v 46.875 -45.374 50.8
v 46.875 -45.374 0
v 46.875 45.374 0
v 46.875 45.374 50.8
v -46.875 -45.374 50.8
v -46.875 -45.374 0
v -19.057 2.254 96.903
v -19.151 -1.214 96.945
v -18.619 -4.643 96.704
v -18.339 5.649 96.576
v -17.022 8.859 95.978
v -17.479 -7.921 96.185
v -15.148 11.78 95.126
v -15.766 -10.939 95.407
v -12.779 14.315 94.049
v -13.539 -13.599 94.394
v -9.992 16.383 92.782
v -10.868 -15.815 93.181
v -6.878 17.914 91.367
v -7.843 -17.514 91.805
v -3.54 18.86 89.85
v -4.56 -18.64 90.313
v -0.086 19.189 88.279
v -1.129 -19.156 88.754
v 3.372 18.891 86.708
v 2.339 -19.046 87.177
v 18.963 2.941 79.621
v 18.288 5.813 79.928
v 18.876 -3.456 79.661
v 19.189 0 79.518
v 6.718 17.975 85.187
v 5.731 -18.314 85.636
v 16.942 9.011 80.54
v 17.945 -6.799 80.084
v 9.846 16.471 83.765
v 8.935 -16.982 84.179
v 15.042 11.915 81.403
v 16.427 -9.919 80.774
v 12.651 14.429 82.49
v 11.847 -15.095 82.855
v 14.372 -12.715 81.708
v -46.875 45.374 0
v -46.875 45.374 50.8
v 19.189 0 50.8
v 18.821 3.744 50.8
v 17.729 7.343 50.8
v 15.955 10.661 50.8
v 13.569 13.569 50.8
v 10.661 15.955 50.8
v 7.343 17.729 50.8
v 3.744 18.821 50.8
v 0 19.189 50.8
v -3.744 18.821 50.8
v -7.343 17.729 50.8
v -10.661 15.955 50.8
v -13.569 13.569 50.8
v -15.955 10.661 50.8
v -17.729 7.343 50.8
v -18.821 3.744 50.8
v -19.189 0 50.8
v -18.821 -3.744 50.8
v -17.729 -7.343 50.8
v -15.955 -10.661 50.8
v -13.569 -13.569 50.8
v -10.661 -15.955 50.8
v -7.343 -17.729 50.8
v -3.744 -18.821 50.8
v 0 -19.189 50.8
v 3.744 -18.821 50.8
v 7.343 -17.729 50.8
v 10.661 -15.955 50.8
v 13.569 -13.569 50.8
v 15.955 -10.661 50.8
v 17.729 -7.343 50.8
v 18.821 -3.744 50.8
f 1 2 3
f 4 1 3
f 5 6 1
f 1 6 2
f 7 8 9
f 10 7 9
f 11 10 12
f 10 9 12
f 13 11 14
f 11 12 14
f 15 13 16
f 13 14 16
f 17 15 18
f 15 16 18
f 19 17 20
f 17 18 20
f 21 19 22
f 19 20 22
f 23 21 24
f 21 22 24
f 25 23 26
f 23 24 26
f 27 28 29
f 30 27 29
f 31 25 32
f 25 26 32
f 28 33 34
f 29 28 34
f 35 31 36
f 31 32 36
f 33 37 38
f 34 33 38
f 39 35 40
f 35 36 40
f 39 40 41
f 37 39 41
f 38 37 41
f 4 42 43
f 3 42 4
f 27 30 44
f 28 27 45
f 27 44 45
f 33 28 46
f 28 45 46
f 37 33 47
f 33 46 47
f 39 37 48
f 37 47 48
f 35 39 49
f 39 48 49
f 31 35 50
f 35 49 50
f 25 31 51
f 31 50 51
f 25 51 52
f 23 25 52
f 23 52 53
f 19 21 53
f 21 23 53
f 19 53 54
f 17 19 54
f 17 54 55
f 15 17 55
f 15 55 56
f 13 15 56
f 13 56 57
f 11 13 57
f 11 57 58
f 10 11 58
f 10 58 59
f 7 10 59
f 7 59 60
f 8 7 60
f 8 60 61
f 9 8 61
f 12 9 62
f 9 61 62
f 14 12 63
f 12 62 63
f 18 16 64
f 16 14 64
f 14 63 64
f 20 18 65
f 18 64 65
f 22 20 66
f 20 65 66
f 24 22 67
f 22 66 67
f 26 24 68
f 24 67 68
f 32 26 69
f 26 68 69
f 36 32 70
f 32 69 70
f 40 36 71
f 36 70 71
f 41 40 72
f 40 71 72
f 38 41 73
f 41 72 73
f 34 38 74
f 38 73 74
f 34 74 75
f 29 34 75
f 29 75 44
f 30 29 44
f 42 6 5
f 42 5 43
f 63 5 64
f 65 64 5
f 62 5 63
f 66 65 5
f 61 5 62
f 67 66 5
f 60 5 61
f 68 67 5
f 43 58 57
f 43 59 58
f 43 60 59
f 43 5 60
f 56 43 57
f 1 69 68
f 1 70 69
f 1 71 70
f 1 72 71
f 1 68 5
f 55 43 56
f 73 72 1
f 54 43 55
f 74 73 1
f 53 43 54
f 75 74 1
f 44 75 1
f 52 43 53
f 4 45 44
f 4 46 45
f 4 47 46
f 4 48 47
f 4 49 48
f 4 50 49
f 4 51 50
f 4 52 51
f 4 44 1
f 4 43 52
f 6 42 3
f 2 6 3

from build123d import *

# Parameters (mm, degrees)
F0_W     = 93.749092
F0_H     = 90.747274
F1_DEPTH = 50.8
F2_R     = 19.189435
F3_DEPTH = 50.8
F5_DEPTH = 67.564


with BuildPart() as f1:
    # F0 (on Top) → F1 (new body)
    with BuildSketch(Plane.XY):
        Rectangle(F0_W, F0_H)
    extrude(amount=F1_DEPTH)

    # F2 (on face) → F3 (join)
    with BuildSketch(Plane.XY.offset(50.8)):
        Circle(F2_R)
    extrude(amount=F3_DEPTH)

    # F4 (on Front) → F5 (cut, symmetric)
    with BuildSketch(Plane.XZ):
        Polygon((59.805457, 108.200155), (-43.911207, 108.200155), (59.805457, 61.056212), align=None)
    extrude(amount=F5_DEPTH, both=True, mode=Mode.SUBTRACT)


solid = f1.part
